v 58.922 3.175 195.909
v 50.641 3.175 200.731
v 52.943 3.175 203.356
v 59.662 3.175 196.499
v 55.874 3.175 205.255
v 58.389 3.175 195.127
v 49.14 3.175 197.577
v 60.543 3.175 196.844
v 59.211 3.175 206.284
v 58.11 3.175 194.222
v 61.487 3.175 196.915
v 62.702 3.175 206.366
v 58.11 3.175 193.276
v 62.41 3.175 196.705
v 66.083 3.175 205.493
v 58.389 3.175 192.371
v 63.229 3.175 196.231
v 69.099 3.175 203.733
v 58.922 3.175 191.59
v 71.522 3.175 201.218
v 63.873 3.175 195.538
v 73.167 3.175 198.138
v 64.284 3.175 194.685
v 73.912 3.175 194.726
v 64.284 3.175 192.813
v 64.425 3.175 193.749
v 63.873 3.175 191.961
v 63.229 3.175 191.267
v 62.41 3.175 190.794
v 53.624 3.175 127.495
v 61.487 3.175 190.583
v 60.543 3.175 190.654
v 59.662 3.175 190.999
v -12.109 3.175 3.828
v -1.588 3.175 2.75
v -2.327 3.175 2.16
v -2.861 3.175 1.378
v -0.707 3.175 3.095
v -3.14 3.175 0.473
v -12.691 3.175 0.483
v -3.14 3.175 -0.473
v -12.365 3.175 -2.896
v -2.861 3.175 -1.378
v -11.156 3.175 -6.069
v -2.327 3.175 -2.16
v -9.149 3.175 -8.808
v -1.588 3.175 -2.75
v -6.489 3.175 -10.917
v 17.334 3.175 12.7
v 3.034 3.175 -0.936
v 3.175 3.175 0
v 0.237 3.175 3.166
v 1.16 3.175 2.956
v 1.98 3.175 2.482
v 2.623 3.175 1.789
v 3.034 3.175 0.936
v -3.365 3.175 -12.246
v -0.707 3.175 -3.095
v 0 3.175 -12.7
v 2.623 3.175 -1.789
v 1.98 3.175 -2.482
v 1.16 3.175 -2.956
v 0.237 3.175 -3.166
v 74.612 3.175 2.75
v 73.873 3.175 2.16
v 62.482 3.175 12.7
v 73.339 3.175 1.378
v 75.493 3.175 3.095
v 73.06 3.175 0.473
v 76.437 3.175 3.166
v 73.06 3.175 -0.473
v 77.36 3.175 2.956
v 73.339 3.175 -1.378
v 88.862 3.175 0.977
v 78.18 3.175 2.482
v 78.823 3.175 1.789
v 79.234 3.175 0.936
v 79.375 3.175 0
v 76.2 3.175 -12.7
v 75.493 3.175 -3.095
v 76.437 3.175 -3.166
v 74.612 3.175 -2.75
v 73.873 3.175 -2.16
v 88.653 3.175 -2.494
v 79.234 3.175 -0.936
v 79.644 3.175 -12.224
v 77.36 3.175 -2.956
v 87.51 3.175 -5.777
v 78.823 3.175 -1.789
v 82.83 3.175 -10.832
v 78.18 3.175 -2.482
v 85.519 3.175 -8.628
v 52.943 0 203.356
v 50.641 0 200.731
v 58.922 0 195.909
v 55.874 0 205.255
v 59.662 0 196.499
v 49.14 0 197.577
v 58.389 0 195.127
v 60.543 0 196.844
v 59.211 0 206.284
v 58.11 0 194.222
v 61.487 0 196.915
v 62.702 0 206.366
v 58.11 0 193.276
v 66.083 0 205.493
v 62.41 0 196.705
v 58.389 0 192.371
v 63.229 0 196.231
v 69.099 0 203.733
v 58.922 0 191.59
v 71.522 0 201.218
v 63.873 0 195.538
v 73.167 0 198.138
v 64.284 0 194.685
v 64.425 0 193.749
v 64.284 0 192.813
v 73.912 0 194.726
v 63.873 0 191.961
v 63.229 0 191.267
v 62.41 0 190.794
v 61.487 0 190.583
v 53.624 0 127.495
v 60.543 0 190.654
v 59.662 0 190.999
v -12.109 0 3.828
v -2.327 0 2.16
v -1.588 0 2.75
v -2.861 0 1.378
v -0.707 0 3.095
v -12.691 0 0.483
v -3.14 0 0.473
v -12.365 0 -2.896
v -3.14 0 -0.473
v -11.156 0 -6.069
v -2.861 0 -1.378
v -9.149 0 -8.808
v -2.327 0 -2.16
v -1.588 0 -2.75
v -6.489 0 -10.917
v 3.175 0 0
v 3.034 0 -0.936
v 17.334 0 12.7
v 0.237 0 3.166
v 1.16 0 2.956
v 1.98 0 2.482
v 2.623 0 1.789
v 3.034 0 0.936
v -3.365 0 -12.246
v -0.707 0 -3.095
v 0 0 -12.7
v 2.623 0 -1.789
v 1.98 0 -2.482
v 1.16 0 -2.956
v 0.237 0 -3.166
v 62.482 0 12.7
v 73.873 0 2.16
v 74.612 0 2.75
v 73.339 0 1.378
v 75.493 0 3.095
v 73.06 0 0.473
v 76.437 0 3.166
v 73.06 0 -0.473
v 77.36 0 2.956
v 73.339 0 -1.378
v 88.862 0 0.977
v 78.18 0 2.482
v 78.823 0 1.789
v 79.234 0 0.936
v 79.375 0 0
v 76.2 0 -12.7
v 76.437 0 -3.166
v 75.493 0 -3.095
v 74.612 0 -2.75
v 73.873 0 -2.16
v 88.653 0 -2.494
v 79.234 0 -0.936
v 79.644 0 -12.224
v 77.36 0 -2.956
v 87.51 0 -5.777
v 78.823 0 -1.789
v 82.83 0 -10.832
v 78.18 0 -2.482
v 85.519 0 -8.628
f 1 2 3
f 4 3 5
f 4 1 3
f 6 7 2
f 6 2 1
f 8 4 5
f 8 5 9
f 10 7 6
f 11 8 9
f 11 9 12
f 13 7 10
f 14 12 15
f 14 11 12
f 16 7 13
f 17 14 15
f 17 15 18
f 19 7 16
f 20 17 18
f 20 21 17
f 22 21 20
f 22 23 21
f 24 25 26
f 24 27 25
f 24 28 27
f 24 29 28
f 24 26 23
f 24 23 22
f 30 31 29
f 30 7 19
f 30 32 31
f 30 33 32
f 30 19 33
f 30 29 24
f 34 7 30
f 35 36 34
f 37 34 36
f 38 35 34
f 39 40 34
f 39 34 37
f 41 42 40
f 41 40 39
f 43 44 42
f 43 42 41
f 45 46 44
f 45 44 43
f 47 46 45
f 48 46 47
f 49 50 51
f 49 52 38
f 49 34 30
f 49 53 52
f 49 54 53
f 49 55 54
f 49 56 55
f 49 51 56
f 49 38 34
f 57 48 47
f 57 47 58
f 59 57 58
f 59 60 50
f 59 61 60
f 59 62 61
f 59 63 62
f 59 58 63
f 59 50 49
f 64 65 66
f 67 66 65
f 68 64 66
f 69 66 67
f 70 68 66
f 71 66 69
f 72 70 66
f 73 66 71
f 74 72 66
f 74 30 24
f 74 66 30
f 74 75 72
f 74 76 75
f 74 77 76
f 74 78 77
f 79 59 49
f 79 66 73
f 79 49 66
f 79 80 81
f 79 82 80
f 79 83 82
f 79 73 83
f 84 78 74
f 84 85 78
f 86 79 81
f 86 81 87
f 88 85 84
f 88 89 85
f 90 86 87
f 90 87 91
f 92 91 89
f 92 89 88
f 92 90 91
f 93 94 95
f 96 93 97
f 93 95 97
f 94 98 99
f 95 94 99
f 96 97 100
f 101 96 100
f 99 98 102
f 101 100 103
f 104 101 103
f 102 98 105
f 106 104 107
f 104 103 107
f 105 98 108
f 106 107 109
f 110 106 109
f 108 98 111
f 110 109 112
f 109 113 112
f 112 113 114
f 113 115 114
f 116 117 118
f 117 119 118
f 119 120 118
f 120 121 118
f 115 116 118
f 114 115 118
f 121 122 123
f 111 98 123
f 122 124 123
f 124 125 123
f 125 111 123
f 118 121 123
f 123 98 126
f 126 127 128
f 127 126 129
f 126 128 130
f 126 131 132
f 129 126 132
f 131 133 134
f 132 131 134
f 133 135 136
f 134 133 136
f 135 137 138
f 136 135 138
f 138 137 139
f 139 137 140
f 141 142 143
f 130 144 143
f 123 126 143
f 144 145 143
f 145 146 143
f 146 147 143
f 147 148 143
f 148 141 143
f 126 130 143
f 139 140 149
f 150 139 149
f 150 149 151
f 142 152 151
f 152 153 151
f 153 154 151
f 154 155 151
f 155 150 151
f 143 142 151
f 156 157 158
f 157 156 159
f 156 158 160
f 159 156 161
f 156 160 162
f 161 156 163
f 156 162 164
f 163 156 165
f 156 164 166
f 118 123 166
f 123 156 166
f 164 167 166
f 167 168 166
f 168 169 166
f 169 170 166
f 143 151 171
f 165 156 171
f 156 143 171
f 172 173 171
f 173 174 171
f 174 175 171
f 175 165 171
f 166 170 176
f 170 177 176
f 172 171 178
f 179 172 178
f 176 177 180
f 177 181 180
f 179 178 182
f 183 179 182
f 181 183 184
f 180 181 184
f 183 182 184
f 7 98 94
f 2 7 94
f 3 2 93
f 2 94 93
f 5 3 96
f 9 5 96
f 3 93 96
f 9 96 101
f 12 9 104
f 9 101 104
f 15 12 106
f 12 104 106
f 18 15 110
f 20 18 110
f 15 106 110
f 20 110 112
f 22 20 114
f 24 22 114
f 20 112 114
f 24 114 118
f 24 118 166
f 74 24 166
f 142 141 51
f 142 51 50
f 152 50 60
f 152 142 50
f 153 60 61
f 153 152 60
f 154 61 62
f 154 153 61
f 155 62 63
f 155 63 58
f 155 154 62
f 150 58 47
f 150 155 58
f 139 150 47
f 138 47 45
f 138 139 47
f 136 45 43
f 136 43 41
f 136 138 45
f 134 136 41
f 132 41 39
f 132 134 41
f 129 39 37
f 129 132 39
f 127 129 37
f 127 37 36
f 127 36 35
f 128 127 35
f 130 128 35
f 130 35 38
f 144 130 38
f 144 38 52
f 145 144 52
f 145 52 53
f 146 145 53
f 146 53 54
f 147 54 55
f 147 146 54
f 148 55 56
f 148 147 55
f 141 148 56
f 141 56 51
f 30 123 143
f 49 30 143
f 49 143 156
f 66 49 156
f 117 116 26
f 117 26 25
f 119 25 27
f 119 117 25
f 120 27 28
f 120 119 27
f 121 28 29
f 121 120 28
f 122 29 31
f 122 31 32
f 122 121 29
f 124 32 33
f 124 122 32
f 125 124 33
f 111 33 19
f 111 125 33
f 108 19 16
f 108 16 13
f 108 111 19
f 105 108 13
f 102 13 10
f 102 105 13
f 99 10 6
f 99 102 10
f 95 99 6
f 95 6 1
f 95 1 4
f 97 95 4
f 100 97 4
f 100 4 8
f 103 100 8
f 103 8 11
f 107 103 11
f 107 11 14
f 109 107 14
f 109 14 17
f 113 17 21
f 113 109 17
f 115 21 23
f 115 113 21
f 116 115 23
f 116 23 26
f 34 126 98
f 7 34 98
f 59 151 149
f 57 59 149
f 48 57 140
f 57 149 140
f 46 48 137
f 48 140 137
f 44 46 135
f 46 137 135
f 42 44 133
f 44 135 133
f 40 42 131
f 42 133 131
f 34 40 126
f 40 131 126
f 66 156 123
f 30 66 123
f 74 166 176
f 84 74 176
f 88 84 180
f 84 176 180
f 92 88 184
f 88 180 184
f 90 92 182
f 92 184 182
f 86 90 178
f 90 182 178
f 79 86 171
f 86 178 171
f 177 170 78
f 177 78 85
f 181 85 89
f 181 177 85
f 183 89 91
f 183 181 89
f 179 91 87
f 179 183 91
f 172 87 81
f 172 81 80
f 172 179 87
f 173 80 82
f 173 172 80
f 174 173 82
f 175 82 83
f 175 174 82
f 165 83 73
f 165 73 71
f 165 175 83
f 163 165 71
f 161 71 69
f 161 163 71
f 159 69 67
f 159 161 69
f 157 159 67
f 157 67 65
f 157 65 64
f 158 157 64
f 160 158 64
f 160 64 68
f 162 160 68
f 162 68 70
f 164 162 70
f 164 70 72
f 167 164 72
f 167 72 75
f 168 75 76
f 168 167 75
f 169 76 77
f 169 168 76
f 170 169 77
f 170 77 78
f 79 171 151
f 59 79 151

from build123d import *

# Parameters (mm, degrees)
SKETCH1_R           = 3.175
BOSS_EXTRUDE2_DEPTH = 3.175


with BuildPart() as part:
    # Sketch1 → Boss-Extrude2 (new body)
    with BuildSketch(Plane(origin=(0, 0, 0), x_dir=(1, 0, 0), z_dir=(0, 1, 0))):
        with BuildLine():
            ThreePointArc((88.862359447, -0.977063577), (85.519300066, 8.627899298), (76.2, 12.7))
            Line((76.2, 12.7), (0, 12.7))
            ThreePointArc((0, 12.7), (-10.244681695, 7.505764249), (-12.109317419, -3.828110715))
            Line((-12.109317419, -3.828110715), (49.140454024, -197.577189418))
            ThreePointArc((49.140454024, -197.577189418), (62.701866935, -206.365790583), (73.91213089, -194.726142279))
            Line((73.91213089, -194.726142279), (88.862359447, -0.977063577))
        make_face()
        Circle(SKETCH1_R, mode=Mode.SUBTRACT)
        Polygon((17.334338412, -12.7), (62.482279527, -12.7), (53.624378759, -127.494908088), align=None, mode=Mode.SUBTRACT)
        with Locations((61.249771443, -193.749078703)):
            Circle(SKETCH1_R, mode=Mode.SUBTRACT)
        with Locations((76.2, 0)):
            Circle(SKETCH1_R, mode=Mode.SUBTRACT)
    extrude(amount=BOSS_EXTRUDE2_DEPTH)


solid = part.part
